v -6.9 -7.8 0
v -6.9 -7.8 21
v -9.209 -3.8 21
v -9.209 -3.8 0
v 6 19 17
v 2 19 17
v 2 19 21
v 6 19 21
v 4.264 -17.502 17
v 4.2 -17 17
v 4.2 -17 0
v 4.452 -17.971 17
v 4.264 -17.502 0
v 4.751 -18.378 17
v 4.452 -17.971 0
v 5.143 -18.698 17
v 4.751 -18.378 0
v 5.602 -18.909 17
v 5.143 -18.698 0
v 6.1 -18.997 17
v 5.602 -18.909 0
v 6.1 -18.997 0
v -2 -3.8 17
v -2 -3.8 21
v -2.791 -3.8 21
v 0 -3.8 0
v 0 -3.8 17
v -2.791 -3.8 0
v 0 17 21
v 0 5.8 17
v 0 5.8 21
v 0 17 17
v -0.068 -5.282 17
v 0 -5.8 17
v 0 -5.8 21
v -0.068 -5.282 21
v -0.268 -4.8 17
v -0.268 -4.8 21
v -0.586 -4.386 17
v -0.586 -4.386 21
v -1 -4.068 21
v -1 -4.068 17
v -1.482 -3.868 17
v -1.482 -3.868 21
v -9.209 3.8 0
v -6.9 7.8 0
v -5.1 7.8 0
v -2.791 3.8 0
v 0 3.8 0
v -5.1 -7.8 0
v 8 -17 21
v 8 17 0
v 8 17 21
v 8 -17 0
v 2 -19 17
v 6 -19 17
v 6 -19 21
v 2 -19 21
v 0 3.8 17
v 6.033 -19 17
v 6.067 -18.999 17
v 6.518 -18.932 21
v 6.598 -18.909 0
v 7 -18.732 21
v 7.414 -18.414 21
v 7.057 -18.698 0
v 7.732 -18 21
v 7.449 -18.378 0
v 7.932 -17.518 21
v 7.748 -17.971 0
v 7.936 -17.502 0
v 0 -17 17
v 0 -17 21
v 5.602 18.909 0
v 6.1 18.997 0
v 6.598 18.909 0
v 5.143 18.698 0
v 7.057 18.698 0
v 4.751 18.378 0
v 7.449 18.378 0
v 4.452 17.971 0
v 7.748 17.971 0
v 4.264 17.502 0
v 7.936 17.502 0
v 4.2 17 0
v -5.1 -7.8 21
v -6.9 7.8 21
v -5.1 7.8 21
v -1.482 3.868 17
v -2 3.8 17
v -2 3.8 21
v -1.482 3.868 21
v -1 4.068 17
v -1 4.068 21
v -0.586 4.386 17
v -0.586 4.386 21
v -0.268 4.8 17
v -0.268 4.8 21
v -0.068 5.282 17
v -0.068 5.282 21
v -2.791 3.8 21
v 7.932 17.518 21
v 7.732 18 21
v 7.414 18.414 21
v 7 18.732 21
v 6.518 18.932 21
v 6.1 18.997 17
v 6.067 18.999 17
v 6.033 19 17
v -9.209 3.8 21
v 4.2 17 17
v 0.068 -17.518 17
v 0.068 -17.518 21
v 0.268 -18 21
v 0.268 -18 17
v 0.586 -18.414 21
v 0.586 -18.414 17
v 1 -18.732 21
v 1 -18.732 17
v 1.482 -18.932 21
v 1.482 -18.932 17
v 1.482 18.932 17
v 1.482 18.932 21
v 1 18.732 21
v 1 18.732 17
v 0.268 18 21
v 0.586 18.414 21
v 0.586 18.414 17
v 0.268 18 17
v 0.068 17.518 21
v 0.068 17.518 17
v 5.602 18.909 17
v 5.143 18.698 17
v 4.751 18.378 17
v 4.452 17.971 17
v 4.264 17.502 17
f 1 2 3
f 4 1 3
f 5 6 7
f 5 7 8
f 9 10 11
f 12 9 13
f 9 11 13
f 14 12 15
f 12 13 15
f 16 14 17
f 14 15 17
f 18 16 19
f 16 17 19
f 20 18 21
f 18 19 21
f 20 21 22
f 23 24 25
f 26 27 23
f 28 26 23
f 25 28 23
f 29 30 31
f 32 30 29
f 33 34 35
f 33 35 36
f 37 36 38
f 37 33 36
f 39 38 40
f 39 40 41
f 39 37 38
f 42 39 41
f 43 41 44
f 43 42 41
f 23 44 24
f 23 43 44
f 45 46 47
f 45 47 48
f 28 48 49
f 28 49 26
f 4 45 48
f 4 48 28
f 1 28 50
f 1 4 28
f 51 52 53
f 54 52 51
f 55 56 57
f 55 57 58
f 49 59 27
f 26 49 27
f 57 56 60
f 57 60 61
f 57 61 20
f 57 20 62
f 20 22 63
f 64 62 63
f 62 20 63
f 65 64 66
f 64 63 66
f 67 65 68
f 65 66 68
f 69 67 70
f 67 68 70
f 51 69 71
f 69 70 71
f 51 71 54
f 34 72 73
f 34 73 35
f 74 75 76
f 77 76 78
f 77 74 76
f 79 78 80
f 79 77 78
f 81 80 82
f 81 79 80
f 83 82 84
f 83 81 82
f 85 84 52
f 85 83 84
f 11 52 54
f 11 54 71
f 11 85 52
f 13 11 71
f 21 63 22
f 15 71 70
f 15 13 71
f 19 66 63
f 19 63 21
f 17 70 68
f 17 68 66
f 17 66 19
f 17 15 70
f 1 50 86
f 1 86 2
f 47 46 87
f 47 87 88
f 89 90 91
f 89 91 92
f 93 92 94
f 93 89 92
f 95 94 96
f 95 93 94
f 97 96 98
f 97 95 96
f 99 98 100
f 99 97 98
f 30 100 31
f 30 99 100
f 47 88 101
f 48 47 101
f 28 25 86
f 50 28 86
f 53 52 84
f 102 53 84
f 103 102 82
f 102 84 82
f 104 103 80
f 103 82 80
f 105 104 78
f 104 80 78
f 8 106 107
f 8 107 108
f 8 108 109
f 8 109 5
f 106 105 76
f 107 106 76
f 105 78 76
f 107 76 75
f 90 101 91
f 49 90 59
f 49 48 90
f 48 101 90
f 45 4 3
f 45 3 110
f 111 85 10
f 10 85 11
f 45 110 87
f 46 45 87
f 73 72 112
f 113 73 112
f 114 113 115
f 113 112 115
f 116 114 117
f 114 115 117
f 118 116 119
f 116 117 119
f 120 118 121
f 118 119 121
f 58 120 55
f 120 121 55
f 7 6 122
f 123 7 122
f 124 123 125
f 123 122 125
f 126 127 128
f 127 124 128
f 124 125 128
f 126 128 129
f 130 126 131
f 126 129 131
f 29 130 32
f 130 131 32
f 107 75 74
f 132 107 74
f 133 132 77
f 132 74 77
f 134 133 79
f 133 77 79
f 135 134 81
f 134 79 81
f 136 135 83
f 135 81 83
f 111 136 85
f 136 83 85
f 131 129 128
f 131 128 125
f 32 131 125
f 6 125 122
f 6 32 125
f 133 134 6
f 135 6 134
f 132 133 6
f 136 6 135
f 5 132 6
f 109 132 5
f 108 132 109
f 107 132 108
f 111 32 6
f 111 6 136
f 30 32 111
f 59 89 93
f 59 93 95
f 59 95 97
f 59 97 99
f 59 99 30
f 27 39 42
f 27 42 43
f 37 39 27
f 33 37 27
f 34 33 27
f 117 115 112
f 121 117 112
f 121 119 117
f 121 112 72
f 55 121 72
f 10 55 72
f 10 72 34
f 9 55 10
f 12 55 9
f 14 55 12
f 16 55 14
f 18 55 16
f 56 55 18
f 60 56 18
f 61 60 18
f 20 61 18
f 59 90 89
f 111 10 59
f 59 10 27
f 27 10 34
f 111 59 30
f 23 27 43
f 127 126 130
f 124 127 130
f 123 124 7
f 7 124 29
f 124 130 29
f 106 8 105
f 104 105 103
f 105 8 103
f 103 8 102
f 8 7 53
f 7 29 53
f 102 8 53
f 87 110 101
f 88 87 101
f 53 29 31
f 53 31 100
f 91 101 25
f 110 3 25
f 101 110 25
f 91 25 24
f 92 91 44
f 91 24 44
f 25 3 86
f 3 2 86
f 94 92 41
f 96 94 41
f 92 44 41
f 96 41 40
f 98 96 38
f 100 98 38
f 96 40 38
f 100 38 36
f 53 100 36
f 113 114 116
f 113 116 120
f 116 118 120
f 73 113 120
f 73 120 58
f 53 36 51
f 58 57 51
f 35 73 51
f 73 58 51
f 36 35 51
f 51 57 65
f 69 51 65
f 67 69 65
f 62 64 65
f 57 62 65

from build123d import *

# Parameters (mm, degrees)
SALIENTE_EXTRUIR1_DEPTH = 21
CROQUIS3_W              = 4.2
CROQUIS3_H              = 38
CORTAR_EXTRUIR1_DEPTH   = 17
REDONDEO1_R             = 2


with BuildPart() as part:
    # Croquis1 → Saliente-Extruir1 (new body)
    with BuildSketch(Plane(origin=(0, 0, 0), x_dir=(0, 1, 0), z_dir=(0, 0, 1))):
        Polygon((-3.8, 9.209401077), (3.8, 9.209401077), (7.8, 6.9), (7.8, 5.1), (3.8, 2.790598923), (3.8, 0), (19, 0), (19, -8), (-19, -8), (-19, 0), (-3.8, 0), (-3.8, 2.790598923), (-7.8, 5.1), (-7.8, 6.9), align=None)
    extrude(amount=SALIENTE_EXTRUIR1_DEPTH)

    # Croquis3 → Cortar-Extruir1 (cut)
    with BuildSketch(Plane(origin=(0, 0, 0), x_dir=(1, 0, 0), z_dir=(0, 0, -1))):
        with Locations((2.1, 0)):
            Rectangle(CROQUIS3_W, CROQUIS3_H)
    extrude(amount=-CORTAR_EXTRUIR1_DEPTH, mode=Mode.SUBTRACT)

    # Redondeo1
    # the kernel refuses this fillet: 2 mm, written as the material it adds along each edge
    with BuildSketch(Plane(origin=(0, -3.8, 17), x_dir=(-1, 0, 0), z_dir=(0, 0, 1))) as redondeo1_piece_1:
        with BuildLine():
            CenterArc((REDONDEO1_R, REDONDEO1_R), REDONDEO1_R, 180, 90)
            Line((0, REDONDEO1_R), (0, 0))
            Line((0, 0), (REDONDEO1_R, 0))
        make_face()
    extrude(amount=4)
    with BuildSketch(Plane(origin=(0, 3.8, 17), x_dir=(-1, 0, 0), z_dir=(0, 0, 1))) as redondeo1_piece_2:
        with BuildLine():
            CenterArc((REDONDEO1_R, -REDONDEO1_R), REDONDEO1_R, 90, 90)
            Line((0, -REDONDEO1_R), (0, 0))
            Line((0, 0), (REDONDEO1_R, 0))
        make_face()
    extrude(amount=4)
    # the kernel refuses this fillet: 2 mm, written as the material it takes off along each edge
    with BuildSketch(Plane(origin=(8, 19, -5), x_dir=(-1, 0, 0), z_dir=(0, 0, 1)), Plane(origin=(8, -19, -5), x_dir=(0, 1, 0), z_dir=(0, 0, 1))) as redondeo1_2_piece_1:
        with BuildLine():
            CenterArc((REDONDEO1_R, REDONDEO1_R), REDONDEO1_R, 180, 90)
            Line((0, REDONDEO1_R), (0, 0))
            Line((0, 0), (REDONDEO1_R, 0))
        make_face()
    extrude(amount=31, mode=Mode.SUBTRACT)
    with BuildSketch(Plane(origin=(4.2, -19, -5), x_dir=(1, 0, 0), z_dir=(0, 0, 1))) as redondeo1_2_piece_2:
        with BuildLine():
            CenterArc((REDONDEO1_R, REDONDEO1_R), REDONDEO1_R, 180, 90)
            Line((0, REDONDEO1_R), (0, 0))
            Line((0, 0), (REDONDEO1_R, 0))
        make_face()
    extrude(amount=22, mode=Mode.SUBTRACT)
    with BuildSketch(Plane(origin=(0, -19, 12), x_dir=(1, 0, 0), z_dir=(0, 0, 1)), Plane(origin=(0, 19, 12), x_dir=(0, -1, 0), z_dir=(0, 0, 1))) as redondeo1_2_piece_3:
        with BuildLine():
            CenterArc((REDONDEO1_R, REDONDEO1_R), REDONDEO1_R, 180, 90)
            Line((0, REDONDEO1_R), (0, 0))
            Line((0, 0), (REDONDEO1_R, 0))
        make_face()
    extrude(amount=14, mode=Mode.SUBTRACT)
    with BuildSketch(Plane(origin=(4.2, 19, -5), x_dir=(1, 0, 0), z_dir=(0, 0, 1))) as redondeo1_2_piece_4:
        with BuildLine():
            CenterArc((REDONDEO1_R, -REDONDEO1_R), REDONDEO1_R, 90, 90)
            Line((0, -REDONDEO1_R), (0, 0))
            Line((0, 0), (REDONDEO1_R, 0))
        make_face()
    extrude(amount=22, mode=Mode.SUBTRACT)


solid = part.part
